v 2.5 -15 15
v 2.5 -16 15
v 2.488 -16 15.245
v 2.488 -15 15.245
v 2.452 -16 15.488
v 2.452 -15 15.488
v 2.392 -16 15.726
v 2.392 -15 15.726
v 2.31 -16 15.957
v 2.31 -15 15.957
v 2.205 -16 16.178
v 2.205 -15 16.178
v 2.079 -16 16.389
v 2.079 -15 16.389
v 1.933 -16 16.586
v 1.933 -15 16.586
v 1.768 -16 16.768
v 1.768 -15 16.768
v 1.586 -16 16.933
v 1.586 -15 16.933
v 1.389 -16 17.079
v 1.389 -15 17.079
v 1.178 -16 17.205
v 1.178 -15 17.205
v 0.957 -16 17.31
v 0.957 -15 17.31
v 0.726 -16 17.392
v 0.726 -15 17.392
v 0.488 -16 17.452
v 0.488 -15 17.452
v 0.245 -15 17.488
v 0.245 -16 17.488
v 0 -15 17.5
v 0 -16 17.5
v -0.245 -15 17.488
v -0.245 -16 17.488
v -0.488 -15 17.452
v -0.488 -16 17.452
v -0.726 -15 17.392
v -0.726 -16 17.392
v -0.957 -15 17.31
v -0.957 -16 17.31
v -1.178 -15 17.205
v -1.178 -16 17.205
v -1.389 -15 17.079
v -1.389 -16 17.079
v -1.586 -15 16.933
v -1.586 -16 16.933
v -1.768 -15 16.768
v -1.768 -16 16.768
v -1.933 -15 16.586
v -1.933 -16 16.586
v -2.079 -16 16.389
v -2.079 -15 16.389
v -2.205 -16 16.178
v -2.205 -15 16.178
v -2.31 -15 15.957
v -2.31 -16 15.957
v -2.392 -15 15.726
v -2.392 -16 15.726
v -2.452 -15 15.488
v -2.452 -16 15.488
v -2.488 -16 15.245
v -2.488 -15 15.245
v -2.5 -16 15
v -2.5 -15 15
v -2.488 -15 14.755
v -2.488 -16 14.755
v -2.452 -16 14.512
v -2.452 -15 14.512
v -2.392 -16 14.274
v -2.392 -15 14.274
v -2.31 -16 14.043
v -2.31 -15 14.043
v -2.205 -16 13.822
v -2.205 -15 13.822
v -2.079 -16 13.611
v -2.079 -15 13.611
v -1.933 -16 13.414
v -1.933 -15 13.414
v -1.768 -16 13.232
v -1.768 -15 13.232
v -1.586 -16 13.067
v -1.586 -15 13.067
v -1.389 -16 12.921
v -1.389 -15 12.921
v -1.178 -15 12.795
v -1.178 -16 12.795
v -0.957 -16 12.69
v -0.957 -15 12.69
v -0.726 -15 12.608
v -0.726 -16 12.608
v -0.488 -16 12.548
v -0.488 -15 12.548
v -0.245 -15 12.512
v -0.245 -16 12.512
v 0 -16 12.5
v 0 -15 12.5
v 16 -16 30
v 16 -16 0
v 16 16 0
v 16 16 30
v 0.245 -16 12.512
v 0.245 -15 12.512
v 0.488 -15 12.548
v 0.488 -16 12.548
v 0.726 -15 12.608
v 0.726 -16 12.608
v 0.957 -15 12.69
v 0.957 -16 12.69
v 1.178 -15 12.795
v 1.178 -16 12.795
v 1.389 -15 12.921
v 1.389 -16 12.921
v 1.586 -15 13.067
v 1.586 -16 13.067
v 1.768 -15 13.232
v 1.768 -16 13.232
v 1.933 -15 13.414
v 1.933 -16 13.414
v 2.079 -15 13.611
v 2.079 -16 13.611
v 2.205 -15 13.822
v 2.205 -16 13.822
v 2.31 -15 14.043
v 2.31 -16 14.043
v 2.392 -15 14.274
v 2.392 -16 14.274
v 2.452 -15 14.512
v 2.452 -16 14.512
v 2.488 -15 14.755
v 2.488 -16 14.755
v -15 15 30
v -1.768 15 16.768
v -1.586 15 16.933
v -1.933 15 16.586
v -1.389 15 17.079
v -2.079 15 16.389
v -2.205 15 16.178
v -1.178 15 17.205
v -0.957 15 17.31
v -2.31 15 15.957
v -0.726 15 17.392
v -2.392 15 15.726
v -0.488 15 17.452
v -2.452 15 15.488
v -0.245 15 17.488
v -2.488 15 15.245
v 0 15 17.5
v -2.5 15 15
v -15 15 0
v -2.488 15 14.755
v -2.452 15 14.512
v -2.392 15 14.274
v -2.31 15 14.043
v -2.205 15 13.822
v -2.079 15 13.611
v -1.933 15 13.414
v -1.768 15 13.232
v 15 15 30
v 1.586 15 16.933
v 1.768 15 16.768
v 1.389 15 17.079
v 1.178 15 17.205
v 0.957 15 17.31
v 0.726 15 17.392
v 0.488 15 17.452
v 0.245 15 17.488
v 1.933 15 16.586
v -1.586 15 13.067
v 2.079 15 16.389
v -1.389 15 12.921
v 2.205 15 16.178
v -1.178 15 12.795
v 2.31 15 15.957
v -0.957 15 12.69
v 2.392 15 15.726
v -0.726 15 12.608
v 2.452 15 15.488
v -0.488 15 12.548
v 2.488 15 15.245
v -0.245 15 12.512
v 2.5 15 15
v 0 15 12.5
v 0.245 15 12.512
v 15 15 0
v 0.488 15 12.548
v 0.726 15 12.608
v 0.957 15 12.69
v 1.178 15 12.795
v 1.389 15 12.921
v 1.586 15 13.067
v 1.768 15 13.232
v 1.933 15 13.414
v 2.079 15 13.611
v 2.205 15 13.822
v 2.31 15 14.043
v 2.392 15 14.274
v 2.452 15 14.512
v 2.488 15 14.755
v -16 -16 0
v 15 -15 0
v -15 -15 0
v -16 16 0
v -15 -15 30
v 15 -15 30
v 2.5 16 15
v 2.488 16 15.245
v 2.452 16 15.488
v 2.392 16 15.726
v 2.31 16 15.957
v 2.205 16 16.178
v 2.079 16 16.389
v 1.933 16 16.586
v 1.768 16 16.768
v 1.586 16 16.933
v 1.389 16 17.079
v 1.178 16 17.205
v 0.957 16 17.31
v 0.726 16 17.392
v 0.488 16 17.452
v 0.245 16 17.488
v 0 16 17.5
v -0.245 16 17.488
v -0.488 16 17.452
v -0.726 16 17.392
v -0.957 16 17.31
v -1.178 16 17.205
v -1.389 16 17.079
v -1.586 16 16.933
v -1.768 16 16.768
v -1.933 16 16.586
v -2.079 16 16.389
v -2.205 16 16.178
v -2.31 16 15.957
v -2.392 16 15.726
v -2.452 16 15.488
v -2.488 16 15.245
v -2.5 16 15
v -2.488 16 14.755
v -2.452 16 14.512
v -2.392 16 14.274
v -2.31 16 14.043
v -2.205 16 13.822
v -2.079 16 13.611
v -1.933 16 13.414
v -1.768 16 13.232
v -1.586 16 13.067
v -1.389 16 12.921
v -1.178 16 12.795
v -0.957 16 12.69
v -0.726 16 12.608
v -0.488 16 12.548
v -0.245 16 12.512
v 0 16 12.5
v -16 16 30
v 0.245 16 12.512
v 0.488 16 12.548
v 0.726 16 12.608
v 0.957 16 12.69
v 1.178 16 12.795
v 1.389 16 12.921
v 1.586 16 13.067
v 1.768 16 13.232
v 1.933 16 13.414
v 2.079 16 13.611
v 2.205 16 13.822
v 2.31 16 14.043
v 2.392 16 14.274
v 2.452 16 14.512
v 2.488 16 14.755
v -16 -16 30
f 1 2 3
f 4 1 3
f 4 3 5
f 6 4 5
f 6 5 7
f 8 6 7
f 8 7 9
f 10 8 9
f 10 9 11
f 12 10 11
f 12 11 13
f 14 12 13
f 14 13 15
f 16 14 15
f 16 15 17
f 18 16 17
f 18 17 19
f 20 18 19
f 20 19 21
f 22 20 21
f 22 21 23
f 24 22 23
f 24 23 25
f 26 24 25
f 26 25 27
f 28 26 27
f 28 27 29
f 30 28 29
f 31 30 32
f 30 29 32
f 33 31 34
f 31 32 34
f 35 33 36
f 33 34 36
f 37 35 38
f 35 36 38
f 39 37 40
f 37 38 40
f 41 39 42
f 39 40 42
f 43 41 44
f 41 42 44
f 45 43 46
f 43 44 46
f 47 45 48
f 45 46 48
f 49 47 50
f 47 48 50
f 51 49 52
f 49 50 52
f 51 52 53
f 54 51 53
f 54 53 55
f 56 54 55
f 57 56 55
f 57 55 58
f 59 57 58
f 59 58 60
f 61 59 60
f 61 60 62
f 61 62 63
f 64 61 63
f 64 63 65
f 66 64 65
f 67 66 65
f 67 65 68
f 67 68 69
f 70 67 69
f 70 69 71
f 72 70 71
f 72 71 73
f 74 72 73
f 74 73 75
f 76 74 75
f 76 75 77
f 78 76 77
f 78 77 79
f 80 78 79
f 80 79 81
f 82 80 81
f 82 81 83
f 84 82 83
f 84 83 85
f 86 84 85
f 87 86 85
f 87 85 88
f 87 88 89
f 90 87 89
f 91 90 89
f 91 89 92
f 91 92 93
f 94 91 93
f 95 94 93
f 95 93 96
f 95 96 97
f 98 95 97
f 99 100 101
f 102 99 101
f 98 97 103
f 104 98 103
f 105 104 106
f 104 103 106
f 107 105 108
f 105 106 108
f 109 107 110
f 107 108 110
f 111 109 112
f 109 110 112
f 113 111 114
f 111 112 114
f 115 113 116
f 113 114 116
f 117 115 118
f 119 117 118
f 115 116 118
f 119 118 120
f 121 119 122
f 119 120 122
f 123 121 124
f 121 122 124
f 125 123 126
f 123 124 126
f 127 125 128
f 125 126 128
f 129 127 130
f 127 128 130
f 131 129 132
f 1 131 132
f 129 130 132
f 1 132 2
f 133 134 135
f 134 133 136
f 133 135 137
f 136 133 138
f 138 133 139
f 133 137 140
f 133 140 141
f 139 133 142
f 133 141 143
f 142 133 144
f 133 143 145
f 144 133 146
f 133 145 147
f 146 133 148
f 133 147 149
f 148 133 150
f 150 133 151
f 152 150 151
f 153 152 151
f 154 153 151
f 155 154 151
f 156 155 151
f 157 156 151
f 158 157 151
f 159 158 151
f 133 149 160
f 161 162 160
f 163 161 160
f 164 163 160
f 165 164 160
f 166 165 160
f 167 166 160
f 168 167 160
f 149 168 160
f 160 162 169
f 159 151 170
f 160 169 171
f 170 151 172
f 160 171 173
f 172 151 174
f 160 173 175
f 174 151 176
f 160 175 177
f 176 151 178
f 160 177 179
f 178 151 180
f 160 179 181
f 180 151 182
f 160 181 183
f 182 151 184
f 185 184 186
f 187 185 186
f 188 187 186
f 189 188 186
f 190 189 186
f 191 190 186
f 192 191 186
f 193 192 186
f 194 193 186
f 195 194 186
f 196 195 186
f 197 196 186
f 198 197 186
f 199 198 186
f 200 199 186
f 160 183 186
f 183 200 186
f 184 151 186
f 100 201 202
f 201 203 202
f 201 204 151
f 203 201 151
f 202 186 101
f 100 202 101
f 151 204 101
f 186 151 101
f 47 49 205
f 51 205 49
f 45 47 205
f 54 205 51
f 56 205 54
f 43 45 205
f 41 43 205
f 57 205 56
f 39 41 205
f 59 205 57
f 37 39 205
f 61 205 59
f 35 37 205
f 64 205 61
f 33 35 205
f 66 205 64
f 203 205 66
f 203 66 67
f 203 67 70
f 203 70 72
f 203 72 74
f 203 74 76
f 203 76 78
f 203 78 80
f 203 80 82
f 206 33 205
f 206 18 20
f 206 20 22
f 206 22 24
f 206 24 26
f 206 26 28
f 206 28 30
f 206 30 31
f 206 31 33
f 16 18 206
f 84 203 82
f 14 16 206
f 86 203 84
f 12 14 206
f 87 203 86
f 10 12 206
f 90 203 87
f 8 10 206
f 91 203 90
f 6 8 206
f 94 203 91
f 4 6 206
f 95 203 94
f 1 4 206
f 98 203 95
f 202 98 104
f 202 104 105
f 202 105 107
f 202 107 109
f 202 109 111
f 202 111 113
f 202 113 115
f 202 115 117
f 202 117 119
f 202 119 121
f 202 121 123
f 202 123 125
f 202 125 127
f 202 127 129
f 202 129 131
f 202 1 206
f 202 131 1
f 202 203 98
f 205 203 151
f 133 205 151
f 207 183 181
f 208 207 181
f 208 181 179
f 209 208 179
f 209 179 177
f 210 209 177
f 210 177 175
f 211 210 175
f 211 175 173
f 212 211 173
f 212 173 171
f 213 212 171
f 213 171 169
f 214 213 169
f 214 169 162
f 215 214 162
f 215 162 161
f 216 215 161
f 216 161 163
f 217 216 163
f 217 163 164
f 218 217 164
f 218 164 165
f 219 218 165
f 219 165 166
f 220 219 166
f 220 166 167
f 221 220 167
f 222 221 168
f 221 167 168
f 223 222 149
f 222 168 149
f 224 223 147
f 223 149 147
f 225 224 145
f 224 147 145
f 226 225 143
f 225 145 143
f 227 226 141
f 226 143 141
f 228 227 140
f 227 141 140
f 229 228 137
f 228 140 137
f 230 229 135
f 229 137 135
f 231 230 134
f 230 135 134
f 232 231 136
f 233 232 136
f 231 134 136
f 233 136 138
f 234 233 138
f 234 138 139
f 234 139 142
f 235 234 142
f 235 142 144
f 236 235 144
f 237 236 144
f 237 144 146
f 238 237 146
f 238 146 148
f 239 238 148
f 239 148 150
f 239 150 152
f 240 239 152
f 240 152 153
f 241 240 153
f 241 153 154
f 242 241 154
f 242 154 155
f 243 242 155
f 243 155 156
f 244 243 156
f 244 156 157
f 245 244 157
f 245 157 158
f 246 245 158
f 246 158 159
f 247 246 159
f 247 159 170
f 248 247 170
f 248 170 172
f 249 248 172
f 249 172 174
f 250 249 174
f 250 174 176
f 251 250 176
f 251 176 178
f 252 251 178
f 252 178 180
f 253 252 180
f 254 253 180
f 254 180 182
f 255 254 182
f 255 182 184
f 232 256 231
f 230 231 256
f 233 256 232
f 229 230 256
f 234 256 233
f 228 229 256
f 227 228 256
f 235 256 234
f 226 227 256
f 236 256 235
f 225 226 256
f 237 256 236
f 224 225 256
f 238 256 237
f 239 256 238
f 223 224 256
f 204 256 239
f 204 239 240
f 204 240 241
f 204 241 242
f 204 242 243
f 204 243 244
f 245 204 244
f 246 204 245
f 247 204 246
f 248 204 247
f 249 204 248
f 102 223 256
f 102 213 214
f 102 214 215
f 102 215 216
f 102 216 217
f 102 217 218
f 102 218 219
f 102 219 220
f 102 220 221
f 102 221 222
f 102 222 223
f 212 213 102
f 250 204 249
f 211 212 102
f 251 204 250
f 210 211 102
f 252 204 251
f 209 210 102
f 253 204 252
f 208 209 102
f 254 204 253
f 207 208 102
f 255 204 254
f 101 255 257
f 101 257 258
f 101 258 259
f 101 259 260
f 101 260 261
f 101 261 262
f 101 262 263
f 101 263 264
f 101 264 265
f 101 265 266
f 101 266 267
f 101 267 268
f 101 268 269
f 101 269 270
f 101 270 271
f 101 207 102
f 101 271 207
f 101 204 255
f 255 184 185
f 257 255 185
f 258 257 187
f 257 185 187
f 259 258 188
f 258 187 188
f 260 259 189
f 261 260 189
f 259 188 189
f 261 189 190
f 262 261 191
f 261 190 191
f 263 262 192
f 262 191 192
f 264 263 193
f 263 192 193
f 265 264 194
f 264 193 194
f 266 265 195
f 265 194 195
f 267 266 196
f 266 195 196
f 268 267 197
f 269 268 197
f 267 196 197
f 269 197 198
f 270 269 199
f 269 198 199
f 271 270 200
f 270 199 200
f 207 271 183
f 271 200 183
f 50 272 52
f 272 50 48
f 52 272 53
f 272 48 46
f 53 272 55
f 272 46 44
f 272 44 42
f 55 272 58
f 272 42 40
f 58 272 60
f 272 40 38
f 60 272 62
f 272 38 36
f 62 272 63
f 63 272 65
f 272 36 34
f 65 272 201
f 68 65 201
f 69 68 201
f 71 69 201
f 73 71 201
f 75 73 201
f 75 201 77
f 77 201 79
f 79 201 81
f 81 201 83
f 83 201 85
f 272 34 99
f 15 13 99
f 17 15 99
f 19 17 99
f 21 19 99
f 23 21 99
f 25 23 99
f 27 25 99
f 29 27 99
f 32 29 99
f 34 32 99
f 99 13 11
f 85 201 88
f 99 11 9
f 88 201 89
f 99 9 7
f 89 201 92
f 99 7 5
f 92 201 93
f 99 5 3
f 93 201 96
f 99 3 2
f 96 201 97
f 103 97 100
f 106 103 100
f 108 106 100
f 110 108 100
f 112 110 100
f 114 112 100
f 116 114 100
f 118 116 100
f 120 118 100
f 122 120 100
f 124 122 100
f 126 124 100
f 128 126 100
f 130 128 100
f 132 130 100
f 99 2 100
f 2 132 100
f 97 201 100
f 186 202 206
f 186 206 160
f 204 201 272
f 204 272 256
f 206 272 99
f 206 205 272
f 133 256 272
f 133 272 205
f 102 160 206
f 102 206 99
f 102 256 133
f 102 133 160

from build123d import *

# Parameters (mm, degrees)
F0_W     = 32
F0_H     = 32
F0_W_2   = 30
F0_H_2   = 30
F1_DEPTH = 30
F3_DEPTH = 50


with BuildPart() as f1:
    # F0 (on Top) → F1 (new body)
    with BuildSketch(Plane.XY):
        Rectangle(F0_W, F0_H)
        Rectangle(F0_W_2, F0_H_2, mode=Mode.SUBTRACT)
    extrude(amount=F1_DEPTH)

    # F2 (on face) → F3 (cut)
    with BuildSketch(Plane.XZ.offset(16)):
        with BuildLine():
            ThreePointArc((0, 12.5), (1.767767, 13.232233), (2.5, 15))
            ThreePointArc((2.5, 15), (-1.767767, 16.767767), (0, 12.5))
        make_face()
    extrude(amount=-F3_DEPTH, mode=Mode.SUBTRACT)


solid = f1.part
